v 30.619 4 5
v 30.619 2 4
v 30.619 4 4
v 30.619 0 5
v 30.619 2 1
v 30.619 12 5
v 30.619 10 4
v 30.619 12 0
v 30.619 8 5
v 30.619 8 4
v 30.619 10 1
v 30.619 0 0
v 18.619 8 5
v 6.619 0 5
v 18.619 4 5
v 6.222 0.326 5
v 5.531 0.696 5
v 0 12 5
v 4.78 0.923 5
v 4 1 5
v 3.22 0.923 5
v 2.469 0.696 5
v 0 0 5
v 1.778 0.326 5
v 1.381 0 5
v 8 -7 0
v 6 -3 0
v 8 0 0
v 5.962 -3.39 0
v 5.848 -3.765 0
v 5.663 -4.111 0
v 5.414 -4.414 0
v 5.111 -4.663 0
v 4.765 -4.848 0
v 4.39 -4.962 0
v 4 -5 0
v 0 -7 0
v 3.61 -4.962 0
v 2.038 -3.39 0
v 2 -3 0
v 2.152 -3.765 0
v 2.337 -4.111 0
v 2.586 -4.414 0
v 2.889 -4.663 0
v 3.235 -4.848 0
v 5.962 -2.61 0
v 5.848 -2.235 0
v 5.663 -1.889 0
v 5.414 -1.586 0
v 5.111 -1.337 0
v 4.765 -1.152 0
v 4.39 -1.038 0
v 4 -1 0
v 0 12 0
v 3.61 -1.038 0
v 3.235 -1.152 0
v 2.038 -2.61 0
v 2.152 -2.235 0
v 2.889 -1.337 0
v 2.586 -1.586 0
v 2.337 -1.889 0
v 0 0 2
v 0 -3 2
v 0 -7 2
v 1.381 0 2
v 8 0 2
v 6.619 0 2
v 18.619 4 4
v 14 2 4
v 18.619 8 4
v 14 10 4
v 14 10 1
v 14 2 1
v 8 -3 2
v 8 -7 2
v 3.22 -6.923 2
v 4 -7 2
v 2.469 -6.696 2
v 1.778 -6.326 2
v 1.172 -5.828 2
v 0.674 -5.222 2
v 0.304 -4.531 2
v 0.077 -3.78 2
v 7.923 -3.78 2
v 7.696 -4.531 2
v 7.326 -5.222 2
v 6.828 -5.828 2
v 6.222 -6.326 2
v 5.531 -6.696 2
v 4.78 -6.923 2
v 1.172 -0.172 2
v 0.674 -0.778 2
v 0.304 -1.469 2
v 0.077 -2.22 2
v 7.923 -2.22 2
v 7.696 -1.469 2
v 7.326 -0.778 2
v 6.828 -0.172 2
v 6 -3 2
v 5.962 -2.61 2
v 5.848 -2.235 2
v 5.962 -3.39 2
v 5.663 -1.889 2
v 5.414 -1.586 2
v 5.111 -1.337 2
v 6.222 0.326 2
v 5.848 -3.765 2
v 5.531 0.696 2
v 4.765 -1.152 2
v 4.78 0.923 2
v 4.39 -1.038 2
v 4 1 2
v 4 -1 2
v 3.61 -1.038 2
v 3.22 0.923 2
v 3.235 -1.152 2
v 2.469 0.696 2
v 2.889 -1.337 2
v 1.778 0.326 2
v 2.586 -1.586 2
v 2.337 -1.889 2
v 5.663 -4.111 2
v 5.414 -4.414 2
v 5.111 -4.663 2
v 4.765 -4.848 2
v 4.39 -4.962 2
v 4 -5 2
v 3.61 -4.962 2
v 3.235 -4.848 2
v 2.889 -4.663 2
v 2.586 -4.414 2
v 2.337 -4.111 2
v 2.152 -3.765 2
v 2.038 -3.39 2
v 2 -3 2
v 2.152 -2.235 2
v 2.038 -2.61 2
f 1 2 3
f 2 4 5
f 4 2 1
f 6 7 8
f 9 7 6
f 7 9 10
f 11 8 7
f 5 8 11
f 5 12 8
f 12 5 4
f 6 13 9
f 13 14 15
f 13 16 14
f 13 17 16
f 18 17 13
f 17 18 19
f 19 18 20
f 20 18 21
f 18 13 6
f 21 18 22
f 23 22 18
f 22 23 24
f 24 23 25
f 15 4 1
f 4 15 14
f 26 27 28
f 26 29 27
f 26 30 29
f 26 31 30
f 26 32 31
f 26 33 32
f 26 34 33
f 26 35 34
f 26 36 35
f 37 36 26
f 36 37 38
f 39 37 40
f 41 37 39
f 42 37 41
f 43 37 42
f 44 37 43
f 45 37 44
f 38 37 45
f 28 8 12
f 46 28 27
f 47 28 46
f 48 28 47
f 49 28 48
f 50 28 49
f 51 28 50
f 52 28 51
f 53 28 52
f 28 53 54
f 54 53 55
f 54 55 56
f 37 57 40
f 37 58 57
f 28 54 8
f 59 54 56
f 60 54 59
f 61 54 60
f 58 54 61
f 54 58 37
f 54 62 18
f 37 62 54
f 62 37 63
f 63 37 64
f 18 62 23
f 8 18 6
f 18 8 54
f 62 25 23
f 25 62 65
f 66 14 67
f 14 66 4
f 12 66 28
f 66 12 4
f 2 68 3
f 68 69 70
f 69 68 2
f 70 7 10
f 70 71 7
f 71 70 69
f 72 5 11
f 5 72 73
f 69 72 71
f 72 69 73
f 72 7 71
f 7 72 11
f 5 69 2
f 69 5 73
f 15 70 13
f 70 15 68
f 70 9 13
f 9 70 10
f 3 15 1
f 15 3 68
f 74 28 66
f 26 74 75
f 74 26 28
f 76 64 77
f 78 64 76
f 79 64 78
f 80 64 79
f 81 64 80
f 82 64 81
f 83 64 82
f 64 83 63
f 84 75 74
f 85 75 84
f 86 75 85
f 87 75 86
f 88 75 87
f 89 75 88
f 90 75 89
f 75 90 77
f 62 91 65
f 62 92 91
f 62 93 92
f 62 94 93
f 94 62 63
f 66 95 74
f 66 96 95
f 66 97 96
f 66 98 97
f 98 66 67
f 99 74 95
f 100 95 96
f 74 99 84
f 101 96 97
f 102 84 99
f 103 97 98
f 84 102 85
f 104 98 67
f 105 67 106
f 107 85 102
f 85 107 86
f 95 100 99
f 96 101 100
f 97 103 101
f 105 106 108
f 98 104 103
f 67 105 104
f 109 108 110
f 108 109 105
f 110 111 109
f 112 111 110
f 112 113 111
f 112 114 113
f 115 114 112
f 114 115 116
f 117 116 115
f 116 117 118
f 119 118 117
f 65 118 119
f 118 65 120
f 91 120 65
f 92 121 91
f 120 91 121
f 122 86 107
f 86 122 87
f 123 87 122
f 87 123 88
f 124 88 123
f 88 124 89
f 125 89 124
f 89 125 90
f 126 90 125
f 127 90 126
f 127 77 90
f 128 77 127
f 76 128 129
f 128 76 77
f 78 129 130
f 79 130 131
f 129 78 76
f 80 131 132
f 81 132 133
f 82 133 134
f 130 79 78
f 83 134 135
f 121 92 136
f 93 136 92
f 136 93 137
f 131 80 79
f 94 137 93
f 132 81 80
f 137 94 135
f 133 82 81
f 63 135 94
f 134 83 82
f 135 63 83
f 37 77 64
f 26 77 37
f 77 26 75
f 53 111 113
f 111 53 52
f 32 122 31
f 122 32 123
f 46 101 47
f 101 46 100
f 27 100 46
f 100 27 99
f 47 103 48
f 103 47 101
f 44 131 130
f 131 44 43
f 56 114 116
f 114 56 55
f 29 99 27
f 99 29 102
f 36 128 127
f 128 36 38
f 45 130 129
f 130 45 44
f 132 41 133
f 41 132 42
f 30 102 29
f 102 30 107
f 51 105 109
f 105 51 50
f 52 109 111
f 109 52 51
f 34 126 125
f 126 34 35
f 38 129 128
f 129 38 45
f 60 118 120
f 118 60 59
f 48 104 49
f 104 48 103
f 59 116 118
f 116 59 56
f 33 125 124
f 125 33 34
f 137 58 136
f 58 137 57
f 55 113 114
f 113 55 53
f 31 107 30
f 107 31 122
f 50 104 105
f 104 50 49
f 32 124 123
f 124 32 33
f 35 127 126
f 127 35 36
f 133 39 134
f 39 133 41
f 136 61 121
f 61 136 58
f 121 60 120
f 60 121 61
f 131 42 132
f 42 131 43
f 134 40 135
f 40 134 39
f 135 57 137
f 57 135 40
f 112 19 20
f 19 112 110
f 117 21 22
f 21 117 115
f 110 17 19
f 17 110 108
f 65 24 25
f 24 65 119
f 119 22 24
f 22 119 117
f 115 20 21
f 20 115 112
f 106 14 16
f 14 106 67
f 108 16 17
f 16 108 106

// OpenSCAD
$fn = 32;

function hex_d(e2e) = e2e / sin(60);
function hex_r(e2e) = hex_d(e2e) / 2;

board_w = 12;
board_th = 1.6;
board_dz = 5;
board_dx = 32.75;

hole1_x = 9.2;
hole1_y = 3;
hole1_dx = 1.75;

module hole1(th) {
  $fn = 32;
  d = hole1_y;
  translate([d/2, 0]) {
    hull() {
      cylinder(d=d, h=th);
      translate([hole1_x - d, 0])
        cylinder(d=d, h=th);
    }
  }
}

module front() {
  x1 = 5;
  x2 = x1 + hole1_dx;
  x3 = x2 + hole1_x;
  pin_th = 0.5;
  cube([x3, board_w, board_dz]);
  translate([0, 0, board_dz])
    cube([x1, board_w, board_th]);
  translate([0, 0, board_dz + board_th])
    cube([x3, board_w, 2]);
  translate([x2, board_w / 2, board_dz + board_th - pin_th])
    hole1(pin_th);
}


// translate([0, board_w * 3])
//   front();




nut_e2e = 8;
nut_th = 3;
screw_head_d = 8;
screw_thread_d = 4;

module nut_slot() {
  screw_slot_x = 12; // ~8.5 on the board, plus tolerance.
  screw_slot_y = screw_thread_d;
  screw_slot_z = 1;
  nut_slot_x = screw_slot_x + hex_r(nut_e2e);
  x = 10 + screw_head_d/2 + nut_slot_x;
  screw_slot_dx = x - screw_slot_x;
  screw_slot_dy = (board_w - screw_slot_y) / 2;
  screw_slot_dz = board_dz - screw_slot_z;
  nut_slot_dx = x - nut_slot_x;
  nut_slot_dy = (board_w - nut_e2e) / 2;
  nut_slot_dz = board_dz - screw_slot_z - nut_th;
  difference() {
    cube([x, board_w, board_dz]);
    translate([nut_slot_dx, nut_slot_dy, nut_slot_dz])
      cube([nut_slot_x + 1, nut_e2e, nut_th]);
    translate([screw_slot_dx, screw_slot_dy, screw_slot_dz - 0.1])
      cube([screw_slot_x + 1, screw_slot_y, screw_slot_z + 1.1]);
  }
}



module back() {
  dy = -15;
  difference() {
    union() {
      translate([0, board_w + dy - screw_head_d/2, 0])
        cube([screw_head_d, screw_head_d, 2]);
      nut_slot();
    }
    translate([screw_head_d/2, board_w + dy, 0])
      cylinder(d=screw_thread_d, h=2);
    translate([screw_head_d/2, board_w + dy, 2])
      cylinder(d=screw_head_d, h=board_dz);
  }
}

back();
